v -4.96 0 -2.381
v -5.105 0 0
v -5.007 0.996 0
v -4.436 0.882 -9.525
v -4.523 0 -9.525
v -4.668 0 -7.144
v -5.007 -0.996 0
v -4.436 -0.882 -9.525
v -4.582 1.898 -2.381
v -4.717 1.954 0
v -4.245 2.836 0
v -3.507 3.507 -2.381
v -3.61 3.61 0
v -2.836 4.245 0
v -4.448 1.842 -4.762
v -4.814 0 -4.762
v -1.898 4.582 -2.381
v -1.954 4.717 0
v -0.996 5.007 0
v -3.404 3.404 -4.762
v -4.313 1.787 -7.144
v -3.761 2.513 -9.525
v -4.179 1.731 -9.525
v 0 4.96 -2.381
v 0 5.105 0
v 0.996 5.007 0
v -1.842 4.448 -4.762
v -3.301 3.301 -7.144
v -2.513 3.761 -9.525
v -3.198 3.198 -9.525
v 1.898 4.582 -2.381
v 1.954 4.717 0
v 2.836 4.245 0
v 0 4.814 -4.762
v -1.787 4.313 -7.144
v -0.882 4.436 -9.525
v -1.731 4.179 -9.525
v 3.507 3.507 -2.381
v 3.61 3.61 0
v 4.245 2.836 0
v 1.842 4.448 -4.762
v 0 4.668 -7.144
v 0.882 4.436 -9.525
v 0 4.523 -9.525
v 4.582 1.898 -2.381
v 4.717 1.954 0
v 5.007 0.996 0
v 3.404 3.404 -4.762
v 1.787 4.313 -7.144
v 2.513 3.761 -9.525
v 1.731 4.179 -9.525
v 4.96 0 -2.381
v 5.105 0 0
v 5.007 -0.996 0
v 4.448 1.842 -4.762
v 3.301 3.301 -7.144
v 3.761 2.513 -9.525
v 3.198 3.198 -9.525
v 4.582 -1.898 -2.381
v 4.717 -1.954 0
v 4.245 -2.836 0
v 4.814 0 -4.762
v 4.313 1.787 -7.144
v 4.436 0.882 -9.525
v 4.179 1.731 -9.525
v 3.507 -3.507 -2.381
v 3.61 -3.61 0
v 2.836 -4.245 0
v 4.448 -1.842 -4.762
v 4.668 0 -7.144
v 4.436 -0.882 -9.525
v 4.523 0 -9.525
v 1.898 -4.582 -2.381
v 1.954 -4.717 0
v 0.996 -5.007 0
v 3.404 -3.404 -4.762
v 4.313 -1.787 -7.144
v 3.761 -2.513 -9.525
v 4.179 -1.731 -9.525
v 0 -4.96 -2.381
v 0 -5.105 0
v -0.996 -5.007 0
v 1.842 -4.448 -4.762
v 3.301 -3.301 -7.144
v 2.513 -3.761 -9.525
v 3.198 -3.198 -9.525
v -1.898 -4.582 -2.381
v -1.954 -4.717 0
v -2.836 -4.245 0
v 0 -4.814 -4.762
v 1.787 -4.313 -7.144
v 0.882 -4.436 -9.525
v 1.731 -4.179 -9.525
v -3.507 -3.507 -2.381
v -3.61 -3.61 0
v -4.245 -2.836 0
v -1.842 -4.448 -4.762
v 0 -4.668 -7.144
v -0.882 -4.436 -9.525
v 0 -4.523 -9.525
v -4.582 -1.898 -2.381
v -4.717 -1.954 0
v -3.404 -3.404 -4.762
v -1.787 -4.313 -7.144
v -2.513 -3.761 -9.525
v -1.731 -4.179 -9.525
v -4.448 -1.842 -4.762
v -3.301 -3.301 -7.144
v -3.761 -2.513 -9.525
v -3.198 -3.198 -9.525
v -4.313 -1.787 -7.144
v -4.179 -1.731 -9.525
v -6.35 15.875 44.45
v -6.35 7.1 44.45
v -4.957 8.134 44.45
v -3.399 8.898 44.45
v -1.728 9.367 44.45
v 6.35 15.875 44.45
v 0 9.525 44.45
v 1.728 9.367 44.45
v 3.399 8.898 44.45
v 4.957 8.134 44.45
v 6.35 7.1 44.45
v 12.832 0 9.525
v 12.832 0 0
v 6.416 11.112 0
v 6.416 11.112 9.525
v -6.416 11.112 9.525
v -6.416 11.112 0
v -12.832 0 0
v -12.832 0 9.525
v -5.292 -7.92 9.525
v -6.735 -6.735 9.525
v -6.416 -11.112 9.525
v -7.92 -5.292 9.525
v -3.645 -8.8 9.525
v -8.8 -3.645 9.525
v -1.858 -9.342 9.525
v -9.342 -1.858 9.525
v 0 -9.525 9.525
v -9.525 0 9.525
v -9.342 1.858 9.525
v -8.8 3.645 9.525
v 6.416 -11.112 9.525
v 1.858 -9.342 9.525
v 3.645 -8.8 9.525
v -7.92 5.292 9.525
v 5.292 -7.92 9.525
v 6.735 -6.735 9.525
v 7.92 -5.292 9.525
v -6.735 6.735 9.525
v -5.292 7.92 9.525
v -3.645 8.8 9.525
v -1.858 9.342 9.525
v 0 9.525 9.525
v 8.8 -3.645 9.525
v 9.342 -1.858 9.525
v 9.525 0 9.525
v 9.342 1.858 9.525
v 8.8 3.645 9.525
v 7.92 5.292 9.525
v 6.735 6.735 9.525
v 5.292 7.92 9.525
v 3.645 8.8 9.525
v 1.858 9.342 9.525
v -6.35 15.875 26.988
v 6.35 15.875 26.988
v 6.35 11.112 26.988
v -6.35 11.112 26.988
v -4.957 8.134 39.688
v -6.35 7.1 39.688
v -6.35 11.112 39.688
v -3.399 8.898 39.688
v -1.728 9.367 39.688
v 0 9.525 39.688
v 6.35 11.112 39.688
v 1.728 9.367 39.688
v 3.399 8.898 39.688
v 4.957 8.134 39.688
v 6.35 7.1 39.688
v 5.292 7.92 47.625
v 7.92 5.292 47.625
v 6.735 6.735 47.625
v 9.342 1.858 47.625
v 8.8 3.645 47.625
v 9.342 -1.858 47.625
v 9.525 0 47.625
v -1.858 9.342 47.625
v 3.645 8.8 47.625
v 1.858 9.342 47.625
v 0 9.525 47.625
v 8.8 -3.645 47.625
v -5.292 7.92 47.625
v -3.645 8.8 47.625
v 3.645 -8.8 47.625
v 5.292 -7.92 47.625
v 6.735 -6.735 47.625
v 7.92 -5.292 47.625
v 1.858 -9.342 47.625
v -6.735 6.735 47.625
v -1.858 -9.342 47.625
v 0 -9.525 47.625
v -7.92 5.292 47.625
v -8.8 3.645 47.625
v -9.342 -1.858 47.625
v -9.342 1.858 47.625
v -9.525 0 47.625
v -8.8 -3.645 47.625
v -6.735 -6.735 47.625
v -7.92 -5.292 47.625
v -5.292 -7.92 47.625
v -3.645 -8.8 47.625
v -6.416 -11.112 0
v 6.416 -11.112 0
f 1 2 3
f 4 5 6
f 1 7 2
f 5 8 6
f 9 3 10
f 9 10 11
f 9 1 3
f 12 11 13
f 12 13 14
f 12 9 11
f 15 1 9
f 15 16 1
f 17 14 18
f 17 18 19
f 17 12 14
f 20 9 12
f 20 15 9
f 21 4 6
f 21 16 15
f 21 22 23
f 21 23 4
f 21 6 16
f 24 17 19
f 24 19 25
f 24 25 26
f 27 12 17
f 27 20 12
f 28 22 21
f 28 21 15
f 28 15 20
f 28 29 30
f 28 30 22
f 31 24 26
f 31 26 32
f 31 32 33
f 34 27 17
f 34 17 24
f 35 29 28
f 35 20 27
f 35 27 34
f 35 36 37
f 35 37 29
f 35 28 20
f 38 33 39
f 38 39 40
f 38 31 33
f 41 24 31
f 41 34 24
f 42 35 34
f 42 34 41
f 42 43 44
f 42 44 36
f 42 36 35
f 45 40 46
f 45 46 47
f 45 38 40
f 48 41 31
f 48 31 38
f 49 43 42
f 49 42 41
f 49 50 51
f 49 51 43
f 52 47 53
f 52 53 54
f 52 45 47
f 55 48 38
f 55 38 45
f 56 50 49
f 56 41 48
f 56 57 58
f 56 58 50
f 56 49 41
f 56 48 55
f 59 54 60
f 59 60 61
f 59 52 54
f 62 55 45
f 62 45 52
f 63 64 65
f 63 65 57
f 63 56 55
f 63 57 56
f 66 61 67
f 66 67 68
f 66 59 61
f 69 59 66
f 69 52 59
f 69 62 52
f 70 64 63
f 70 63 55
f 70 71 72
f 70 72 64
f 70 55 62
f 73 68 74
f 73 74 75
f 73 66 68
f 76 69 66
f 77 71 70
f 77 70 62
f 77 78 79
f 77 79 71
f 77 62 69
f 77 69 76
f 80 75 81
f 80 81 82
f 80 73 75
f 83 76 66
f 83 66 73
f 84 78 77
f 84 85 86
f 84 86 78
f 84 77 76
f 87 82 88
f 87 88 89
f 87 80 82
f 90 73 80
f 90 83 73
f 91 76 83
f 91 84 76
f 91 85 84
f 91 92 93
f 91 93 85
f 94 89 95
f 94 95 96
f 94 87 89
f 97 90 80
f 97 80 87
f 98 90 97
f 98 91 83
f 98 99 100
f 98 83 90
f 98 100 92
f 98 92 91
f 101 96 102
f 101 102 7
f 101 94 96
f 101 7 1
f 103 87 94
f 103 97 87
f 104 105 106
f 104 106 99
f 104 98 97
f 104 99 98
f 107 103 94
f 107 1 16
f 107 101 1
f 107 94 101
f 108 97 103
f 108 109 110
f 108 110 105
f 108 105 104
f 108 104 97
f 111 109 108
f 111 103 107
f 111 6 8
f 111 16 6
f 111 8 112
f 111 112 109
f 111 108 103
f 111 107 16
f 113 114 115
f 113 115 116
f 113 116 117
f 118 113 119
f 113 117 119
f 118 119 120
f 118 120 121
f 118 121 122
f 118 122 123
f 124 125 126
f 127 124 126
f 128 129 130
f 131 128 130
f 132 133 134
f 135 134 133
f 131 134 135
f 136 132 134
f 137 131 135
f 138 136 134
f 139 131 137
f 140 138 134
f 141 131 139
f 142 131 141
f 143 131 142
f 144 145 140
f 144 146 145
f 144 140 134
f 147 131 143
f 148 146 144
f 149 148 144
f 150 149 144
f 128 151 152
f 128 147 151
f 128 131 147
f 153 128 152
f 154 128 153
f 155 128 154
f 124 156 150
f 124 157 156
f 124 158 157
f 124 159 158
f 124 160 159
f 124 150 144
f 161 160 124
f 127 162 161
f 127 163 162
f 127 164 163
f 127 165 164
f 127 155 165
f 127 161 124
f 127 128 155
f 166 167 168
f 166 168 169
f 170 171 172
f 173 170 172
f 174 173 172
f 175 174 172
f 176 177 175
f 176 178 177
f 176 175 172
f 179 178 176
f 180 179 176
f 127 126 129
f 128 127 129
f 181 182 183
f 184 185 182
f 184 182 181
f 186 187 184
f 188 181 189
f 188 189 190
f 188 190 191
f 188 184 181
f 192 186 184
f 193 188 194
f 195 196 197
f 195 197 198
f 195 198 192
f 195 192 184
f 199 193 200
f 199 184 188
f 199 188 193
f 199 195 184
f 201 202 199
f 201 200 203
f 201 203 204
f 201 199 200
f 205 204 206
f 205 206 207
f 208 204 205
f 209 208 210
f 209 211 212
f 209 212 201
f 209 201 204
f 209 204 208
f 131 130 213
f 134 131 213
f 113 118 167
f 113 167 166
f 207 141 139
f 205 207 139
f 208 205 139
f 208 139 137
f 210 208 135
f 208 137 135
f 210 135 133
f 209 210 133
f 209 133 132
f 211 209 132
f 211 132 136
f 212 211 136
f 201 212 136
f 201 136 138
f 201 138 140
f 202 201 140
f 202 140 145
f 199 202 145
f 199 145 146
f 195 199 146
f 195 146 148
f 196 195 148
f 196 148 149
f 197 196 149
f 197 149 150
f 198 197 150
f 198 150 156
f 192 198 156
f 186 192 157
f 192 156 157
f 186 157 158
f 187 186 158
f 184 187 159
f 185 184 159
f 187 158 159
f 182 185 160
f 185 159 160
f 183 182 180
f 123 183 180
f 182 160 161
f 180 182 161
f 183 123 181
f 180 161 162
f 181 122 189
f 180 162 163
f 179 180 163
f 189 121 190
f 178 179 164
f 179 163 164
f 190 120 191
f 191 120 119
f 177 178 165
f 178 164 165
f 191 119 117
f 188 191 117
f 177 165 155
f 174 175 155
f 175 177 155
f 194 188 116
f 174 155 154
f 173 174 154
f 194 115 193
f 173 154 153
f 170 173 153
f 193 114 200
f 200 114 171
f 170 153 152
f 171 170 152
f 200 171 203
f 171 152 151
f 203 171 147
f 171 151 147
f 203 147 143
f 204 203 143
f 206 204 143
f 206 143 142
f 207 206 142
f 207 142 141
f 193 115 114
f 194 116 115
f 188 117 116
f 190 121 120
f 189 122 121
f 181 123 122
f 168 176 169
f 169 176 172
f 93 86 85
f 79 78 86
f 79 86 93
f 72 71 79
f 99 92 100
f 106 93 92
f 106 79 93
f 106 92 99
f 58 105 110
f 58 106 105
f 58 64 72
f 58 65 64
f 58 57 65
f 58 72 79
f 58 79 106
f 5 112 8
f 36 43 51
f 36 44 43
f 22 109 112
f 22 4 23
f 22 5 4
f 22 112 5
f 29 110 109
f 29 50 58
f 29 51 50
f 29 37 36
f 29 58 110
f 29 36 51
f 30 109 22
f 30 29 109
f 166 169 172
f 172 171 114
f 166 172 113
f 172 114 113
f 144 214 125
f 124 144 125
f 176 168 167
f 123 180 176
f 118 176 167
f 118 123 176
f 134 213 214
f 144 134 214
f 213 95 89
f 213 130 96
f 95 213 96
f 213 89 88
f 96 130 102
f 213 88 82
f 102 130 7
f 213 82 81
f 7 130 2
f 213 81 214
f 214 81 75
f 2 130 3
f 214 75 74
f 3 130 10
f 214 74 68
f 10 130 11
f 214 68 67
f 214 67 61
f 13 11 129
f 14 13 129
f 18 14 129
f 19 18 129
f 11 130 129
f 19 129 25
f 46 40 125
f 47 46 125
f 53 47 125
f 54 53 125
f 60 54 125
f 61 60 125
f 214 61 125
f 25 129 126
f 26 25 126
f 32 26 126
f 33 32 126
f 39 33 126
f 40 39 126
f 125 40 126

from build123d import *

# Parameters (mm, degrees)
BOSS_EXTRUDE1_DEPTH      = 9.525
SKETCH2_R                = 5.1054
BOSS_EXTRUDE2_DEPTH      = 9.525
BOSS_EXTRUDE2_TAPER      = 3.5
SKETCH3_R                = 9.525
BOSS_EXTRUDE3_DEPTH      = 38.1
BOSS_EXTRUDE5_DEPTH      = 6.35
BOSS_EXTRUDE5_DEPTH_BACK = 9.525
SKETCH5_W                = 12.7
SKETCH5_H                = 4.7625
SKETCH6_W                = 12.7
SKETCH6_H                = 4.7625
BOSS_EXTRUDE6_DEPTH      = 12.7


with BuildPart() as part:
    # Sketch1 → Boss-Extrude1 (new body)
    with BuildSketch(Plane.XY):
        Polygon((6.415804866, 11.1125), (-6.415804866, 11.1125), (-12.831609733, 0), (-6.415804866, -11.1125), (6.415804866, -11.1125), (12.831609733, 0), align=None)
    extrude(amount=BOSS_EXTRUDE1_DEPTH)

    # Sketch2 → Boss-Extrude2 (add)
    with BuildSketch(Plane(origin=(0, 0, 0), x_dir=(-1, 0, 0), z_dir=(0, 0, -1))):
        Circle(SKETCH2_R)
    extrude(amount=BOSS_EXTRUDE2_DEPTH, taper=BOSS_EXTRUDE2_TAPER)

    # Sketch3 → Boss-Extrude3 (add)
    with BuildSketch(Plane.XY.offset(9.525)):
        with Locations(Location((0, 0, 0), (0, 0, 180))):
            Circle(SKETCH3_R)
    extrude(amount=BOSS_EXTRUDE3_DEPTH)

    # Sketch5 → Boss-Extrude5 (add, two sides: drawn at the far end of the back side and taken through both)
    with BuildSketch(Plane(origin=(0, 9.525, 0), x_dir=(1, 0, 0), z_dir=(0, 1, 0)).offset(-BOSS_EXTRUDE5_DEPTH_BACK)):
        with Locations((0, -42.06875)):
            Rectangle(SKETCH5_W, SKETCH5_H)
    extrude(amount=BOSS_EXTRUDE5_DEPTH + BOSS_EXTRUDE5_DEPTH_BACK)

    # Sketch6 → Boss-Extrude6 (add)
    with BuildSketch(Plane(origin=(0, 0, 39.6875), x_dir=(-1, 0, 0), z_dir=(0, 0, -1))):
        with Locations((0, 13.49375)):
            Rectangle(SKETCH6_W, SKETCH6_H)
    extrude(amount=BOSS_EXTRUDE6_DEPTH)


solid = part.part
